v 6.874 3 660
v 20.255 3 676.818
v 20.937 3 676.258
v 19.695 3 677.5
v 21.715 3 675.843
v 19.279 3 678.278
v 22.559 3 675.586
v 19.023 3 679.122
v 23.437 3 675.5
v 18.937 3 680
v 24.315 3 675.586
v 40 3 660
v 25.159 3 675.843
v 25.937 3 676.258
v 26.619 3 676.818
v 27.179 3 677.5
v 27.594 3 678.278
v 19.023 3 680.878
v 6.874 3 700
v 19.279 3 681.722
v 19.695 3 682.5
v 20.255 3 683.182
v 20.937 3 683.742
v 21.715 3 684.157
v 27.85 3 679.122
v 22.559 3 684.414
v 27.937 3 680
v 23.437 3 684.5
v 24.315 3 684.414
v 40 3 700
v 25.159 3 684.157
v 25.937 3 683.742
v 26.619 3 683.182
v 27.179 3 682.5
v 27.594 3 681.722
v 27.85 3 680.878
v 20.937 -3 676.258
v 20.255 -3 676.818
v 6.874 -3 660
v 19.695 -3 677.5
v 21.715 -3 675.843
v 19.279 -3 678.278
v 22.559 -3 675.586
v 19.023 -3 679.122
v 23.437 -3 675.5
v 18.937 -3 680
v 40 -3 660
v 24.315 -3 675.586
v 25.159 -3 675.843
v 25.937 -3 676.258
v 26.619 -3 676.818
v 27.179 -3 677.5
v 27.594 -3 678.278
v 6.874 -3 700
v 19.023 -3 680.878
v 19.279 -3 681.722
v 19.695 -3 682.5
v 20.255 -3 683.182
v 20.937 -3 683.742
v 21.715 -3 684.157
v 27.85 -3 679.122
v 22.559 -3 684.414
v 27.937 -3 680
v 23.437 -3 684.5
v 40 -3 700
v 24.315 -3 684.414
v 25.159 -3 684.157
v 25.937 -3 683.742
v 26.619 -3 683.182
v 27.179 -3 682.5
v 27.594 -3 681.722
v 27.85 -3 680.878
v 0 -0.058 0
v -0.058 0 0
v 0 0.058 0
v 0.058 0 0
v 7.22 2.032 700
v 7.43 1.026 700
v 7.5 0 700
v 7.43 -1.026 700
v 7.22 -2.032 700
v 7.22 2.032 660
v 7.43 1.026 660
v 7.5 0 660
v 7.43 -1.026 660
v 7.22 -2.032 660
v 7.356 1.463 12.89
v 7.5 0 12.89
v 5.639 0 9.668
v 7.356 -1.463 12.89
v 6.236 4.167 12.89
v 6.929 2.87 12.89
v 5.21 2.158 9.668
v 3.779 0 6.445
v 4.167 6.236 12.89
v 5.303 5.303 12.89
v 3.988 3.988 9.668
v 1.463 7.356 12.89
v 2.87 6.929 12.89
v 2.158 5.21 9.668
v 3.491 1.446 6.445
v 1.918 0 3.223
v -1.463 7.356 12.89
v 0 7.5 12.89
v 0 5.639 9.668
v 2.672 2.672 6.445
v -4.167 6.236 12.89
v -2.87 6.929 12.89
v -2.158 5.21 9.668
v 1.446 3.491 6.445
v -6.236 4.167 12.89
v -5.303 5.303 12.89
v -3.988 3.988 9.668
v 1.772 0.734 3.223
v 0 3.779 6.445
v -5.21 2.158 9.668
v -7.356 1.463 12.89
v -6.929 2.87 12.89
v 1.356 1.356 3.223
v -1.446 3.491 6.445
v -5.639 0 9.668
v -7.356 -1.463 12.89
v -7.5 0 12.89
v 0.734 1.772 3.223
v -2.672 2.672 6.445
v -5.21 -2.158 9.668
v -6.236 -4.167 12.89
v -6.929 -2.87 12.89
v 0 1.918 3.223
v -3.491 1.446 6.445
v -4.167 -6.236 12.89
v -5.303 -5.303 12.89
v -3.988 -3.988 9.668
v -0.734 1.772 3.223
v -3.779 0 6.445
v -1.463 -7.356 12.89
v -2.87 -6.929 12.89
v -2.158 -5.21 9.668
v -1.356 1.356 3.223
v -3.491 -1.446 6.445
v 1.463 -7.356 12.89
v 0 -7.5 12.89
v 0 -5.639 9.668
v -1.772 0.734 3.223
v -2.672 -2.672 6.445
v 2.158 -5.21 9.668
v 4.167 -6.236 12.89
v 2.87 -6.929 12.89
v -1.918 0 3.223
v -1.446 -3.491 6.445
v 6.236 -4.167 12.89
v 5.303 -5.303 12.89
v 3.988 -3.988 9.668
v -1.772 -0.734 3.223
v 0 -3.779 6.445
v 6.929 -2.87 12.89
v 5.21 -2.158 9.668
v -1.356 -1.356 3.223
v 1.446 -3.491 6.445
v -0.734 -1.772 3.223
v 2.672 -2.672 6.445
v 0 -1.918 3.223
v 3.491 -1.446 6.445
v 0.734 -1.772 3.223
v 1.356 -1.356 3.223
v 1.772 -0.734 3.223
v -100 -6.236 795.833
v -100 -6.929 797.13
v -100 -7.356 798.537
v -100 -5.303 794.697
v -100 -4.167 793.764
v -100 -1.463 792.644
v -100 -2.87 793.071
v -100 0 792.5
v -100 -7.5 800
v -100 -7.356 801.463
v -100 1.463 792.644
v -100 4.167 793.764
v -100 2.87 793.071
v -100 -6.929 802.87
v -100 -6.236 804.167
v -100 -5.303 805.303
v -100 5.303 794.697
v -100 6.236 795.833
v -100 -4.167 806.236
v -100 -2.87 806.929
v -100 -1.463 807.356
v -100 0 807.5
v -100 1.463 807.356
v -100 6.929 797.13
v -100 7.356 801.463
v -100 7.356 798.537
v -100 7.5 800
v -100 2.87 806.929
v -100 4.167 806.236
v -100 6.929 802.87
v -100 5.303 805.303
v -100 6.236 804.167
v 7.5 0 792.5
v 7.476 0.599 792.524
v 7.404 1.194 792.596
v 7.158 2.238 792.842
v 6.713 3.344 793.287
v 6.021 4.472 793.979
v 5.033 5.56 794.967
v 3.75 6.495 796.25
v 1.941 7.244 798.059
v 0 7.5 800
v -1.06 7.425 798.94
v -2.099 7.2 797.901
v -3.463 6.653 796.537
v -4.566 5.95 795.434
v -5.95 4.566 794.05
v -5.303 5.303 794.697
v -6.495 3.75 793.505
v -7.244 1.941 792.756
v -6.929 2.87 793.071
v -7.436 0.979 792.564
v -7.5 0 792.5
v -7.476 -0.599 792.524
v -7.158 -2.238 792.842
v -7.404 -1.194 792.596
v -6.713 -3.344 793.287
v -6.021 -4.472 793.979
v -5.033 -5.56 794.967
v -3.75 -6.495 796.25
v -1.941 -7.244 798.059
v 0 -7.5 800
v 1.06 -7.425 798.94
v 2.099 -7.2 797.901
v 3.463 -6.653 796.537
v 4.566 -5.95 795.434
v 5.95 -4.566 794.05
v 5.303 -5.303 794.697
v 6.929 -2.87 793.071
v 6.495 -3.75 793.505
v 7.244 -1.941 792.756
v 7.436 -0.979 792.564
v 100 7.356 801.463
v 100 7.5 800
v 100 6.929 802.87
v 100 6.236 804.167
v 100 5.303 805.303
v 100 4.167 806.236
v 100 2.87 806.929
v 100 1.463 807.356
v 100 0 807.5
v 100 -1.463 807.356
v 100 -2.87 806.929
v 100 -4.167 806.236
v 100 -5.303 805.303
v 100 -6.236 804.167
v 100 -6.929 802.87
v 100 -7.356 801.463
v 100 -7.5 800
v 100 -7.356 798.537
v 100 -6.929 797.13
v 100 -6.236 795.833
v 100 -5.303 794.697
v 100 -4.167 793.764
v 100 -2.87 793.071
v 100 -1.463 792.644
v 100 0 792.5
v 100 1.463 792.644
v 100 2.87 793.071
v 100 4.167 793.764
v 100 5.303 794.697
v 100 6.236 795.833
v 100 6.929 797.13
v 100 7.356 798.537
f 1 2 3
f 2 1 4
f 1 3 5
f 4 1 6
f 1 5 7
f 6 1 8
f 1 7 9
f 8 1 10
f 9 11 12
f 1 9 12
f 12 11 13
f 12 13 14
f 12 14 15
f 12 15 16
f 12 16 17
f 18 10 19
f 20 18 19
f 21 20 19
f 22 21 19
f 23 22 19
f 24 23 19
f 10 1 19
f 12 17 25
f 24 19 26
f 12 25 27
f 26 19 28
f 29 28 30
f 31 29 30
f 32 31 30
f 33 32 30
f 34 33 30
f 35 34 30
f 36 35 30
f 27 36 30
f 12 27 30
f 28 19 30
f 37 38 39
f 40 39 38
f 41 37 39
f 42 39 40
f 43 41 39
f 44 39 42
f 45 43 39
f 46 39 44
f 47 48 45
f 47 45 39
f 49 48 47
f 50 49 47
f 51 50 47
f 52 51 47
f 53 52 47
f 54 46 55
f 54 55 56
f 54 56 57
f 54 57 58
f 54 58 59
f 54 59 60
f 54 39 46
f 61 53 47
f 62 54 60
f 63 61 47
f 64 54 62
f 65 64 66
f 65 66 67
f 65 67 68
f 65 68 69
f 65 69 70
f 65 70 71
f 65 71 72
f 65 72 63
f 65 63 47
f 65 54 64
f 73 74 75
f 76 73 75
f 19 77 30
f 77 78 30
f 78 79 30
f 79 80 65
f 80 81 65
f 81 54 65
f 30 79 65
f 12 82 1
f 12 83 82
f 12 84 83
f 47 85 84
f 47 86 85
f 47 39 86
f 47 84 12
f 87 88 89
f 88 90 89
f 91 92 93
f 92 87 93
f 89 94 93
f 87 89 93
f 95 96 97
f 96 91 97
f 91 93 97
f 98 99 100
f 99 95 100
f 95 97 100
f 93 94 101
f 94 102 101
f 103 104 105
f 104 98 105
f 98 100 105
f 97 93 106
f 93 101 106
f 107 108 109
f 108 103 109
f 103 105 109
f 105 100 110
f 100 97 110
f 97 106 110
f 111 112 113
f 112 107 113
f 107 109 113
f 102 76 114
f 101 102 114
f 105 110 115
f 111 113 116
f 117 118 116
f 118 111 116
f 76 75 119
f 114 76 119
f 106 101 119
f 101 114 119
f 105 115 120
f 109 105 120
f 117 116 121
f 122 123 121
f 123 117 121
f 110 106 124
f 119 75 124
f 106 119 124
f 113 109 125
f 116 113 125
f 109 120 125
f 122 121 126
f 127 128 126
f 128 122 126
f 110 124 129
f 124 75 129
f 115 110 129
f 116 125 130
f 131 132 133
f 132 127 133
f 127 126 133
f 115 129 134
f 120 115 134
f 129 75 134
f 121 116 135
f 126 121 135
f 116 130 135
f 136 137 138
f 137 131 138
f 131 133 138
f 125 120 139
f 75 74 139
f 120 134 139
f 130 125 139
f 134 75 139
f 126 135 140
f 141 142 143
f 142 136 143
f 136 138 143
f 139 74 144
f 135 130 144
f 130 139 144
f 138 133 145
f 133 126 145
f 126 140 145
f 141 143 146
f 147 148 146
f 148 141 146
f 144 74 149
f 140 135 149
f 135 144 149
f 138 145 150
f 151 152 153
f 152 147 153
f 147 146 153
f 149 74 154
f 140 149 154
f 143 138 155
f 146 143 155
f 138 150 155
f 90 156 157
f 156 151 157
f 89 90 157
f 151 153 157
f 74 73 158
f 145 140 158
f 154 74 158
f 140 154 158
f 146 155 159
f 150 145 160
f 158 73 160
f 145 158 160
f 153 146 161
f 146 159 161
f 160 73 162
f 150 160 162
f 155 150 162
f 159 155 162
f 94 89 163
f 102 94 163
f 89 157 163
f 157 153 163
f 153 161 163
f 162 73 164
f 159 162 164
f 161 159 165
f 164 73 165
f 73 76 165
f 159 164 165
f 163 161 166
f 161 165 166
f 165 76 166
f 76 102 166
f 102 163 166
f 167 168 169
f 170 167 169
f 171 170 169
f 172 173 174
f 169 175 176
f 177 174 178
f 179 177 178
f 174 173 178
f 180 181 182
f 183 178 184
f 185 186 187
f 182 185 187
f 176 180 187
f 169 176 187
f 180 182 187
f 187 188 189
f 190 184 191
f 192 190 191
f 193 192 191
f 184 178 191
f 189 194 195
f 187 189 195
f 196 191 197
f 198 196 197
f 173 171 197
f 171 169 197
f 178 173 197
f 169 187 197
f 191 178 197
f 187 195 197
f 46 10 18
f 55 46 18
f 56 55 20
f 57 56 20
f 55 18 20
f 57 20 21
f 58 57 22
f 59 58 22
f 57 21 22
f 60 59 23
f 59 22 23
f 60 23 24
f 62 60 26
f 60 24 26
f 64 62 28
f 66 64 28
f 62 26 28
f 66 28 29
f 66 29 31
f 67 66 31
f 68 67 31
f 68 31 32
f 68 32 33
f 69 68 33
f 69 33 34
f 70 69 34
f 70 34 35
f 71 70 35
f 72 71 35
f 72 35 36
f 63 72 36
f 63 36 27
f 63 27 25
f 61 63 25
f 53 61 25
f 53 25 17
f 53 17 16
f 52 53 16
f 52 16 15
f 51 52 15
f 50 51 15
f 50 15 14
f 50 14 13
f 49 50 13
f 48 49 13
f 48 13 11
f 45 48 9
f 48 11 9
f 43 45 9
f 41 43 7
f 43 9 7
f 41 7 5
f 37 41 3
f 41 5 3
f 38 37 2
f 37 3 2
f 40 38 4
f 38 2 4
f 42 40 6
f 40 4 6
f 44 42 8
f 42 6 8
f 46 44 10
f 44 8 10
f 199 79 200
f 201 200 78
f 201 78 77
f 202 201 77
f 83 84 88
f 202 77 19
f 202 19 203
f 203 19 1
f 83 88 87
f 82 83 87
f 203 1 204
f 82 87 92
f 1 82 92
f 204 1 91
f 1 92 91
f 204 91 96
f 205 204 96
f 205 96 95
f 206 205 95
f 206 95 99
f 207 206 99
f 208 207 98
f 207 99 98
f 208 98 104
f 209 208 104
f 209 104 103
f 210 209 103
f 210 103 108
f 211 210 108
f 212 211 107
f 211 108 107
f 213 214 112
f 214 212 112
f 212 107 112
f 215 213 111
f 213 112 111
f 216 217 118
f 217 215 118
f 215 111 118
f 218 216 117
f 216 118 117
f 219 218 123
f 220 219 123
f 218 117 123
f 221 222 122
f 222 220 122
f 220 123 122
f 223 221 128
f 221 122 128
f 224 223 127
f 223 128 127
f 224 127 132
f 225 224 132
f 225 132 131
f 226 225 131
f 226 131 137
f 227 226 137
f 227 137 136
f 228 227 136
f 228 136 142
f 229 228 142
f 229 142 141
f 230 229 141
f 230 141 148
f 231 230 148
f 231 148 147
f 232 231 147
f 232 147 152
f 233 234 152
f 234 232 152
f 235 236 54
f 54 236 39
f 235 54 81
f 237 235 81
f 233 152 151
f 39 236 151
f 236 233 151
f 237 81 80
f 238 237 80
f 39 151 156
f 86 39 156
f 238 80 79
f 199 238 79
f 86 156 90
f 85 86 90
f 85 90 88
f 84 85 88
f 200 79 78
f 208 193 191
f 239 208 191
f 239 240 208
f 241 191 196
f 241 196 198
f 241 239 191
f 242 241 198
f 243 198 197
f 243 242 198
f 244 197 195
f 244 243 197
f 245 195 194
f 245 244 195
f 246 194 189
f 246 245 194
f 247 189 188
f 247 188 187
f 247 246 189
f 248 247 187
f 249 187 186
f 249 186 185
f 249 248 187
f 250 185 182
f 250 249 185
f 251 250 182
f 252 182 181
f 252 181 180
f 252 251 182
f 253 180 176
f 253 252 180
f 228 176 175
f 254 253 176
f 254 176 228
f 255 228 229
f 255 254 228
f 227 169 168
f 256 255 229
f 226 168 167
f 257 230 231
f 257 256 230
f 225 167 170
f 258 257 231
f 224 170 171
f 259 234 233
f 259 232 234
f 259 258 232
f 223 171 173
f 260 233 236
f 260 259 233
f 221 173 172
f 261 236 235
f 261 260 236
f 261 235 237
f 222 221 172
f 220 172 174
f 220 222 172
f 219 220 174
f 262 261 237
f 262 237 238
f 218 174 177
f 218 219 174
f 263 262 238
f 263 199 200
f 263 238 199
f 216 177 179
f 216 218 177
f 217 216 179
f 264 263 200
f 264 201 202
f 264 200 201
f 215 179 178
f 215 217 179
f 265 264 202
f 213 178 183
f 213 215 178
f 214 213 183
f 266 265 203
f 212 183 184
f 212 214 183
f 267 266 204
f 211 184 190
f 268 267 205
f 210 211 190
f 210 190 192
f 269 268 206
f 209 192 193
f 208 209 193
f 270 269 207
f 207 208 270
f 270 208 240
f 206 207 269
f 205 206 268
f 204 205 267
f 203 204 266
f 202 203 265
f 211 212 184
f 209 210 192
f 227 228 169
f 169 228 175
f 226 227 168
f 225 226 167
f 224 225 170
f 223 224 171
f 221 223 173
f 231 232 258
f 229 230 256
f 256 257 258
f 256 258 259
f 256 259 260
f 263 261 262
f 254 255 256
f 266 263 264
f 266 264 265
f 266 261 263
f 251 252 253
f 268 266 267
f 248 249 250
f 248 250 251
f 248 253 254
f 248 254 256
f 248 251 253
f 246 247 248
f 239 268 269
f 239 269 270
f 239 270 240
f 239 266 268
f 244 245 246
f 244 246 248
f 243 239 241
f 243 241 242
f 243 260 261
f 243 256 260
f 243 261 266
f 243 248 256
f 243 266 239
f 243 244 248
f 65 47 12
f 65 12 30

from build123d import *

# Parameters (mm, degrees)
F0_R     = 7.5
F1_DEPTH = 800
F2_R     = 7.5
F3_DEPTH = 100
F4_W     = 40
F4_H     = 40
F5_DEPTH = 3
F7_D     = 9


with BuildPart() as f1:
    # F0 (on Top) → F1 (new body)
    with BuildSketch(Plane.XY):
        Circle(F0_R)
    extrude(amount=F1_DEPTH)

    # F2 (on Right) → F3 (join, symmetric)
    with BuildSketch(Plane.YZ):
        with Locations((0, 800)):
            Circle(F2_R)
    extrude(amount=F3_DEPTH, both=True)

    # F4 (on Front) → F5 (join, symmetric)
    with BuildSketch(Plane.XZ):
        with Locations((20, 680)):
            Rectangle(F4_W, F4_H)
    extrude(amount=F5_DEPTH, both=True)

    # F7 (through all)
    with Locations(Plane.XZ.offset(3)):
        with Locations((23.4369317712, 680)):
            Hole(F7_D / 2)

    # F8 (on Front) → F9 (revolve, cut)
    with BuildSketch(Plane.XZ):
        Polygon((10, 17.2205080757), (0.0577350269, 0), (0.0577350269, -0.1), (10, -0.1), align=None)
    revolve(axis=Axis((0, 0, 4.9), (0, 0, 1)), mode=Mode.SUBTRACT)


solid = f1.part
